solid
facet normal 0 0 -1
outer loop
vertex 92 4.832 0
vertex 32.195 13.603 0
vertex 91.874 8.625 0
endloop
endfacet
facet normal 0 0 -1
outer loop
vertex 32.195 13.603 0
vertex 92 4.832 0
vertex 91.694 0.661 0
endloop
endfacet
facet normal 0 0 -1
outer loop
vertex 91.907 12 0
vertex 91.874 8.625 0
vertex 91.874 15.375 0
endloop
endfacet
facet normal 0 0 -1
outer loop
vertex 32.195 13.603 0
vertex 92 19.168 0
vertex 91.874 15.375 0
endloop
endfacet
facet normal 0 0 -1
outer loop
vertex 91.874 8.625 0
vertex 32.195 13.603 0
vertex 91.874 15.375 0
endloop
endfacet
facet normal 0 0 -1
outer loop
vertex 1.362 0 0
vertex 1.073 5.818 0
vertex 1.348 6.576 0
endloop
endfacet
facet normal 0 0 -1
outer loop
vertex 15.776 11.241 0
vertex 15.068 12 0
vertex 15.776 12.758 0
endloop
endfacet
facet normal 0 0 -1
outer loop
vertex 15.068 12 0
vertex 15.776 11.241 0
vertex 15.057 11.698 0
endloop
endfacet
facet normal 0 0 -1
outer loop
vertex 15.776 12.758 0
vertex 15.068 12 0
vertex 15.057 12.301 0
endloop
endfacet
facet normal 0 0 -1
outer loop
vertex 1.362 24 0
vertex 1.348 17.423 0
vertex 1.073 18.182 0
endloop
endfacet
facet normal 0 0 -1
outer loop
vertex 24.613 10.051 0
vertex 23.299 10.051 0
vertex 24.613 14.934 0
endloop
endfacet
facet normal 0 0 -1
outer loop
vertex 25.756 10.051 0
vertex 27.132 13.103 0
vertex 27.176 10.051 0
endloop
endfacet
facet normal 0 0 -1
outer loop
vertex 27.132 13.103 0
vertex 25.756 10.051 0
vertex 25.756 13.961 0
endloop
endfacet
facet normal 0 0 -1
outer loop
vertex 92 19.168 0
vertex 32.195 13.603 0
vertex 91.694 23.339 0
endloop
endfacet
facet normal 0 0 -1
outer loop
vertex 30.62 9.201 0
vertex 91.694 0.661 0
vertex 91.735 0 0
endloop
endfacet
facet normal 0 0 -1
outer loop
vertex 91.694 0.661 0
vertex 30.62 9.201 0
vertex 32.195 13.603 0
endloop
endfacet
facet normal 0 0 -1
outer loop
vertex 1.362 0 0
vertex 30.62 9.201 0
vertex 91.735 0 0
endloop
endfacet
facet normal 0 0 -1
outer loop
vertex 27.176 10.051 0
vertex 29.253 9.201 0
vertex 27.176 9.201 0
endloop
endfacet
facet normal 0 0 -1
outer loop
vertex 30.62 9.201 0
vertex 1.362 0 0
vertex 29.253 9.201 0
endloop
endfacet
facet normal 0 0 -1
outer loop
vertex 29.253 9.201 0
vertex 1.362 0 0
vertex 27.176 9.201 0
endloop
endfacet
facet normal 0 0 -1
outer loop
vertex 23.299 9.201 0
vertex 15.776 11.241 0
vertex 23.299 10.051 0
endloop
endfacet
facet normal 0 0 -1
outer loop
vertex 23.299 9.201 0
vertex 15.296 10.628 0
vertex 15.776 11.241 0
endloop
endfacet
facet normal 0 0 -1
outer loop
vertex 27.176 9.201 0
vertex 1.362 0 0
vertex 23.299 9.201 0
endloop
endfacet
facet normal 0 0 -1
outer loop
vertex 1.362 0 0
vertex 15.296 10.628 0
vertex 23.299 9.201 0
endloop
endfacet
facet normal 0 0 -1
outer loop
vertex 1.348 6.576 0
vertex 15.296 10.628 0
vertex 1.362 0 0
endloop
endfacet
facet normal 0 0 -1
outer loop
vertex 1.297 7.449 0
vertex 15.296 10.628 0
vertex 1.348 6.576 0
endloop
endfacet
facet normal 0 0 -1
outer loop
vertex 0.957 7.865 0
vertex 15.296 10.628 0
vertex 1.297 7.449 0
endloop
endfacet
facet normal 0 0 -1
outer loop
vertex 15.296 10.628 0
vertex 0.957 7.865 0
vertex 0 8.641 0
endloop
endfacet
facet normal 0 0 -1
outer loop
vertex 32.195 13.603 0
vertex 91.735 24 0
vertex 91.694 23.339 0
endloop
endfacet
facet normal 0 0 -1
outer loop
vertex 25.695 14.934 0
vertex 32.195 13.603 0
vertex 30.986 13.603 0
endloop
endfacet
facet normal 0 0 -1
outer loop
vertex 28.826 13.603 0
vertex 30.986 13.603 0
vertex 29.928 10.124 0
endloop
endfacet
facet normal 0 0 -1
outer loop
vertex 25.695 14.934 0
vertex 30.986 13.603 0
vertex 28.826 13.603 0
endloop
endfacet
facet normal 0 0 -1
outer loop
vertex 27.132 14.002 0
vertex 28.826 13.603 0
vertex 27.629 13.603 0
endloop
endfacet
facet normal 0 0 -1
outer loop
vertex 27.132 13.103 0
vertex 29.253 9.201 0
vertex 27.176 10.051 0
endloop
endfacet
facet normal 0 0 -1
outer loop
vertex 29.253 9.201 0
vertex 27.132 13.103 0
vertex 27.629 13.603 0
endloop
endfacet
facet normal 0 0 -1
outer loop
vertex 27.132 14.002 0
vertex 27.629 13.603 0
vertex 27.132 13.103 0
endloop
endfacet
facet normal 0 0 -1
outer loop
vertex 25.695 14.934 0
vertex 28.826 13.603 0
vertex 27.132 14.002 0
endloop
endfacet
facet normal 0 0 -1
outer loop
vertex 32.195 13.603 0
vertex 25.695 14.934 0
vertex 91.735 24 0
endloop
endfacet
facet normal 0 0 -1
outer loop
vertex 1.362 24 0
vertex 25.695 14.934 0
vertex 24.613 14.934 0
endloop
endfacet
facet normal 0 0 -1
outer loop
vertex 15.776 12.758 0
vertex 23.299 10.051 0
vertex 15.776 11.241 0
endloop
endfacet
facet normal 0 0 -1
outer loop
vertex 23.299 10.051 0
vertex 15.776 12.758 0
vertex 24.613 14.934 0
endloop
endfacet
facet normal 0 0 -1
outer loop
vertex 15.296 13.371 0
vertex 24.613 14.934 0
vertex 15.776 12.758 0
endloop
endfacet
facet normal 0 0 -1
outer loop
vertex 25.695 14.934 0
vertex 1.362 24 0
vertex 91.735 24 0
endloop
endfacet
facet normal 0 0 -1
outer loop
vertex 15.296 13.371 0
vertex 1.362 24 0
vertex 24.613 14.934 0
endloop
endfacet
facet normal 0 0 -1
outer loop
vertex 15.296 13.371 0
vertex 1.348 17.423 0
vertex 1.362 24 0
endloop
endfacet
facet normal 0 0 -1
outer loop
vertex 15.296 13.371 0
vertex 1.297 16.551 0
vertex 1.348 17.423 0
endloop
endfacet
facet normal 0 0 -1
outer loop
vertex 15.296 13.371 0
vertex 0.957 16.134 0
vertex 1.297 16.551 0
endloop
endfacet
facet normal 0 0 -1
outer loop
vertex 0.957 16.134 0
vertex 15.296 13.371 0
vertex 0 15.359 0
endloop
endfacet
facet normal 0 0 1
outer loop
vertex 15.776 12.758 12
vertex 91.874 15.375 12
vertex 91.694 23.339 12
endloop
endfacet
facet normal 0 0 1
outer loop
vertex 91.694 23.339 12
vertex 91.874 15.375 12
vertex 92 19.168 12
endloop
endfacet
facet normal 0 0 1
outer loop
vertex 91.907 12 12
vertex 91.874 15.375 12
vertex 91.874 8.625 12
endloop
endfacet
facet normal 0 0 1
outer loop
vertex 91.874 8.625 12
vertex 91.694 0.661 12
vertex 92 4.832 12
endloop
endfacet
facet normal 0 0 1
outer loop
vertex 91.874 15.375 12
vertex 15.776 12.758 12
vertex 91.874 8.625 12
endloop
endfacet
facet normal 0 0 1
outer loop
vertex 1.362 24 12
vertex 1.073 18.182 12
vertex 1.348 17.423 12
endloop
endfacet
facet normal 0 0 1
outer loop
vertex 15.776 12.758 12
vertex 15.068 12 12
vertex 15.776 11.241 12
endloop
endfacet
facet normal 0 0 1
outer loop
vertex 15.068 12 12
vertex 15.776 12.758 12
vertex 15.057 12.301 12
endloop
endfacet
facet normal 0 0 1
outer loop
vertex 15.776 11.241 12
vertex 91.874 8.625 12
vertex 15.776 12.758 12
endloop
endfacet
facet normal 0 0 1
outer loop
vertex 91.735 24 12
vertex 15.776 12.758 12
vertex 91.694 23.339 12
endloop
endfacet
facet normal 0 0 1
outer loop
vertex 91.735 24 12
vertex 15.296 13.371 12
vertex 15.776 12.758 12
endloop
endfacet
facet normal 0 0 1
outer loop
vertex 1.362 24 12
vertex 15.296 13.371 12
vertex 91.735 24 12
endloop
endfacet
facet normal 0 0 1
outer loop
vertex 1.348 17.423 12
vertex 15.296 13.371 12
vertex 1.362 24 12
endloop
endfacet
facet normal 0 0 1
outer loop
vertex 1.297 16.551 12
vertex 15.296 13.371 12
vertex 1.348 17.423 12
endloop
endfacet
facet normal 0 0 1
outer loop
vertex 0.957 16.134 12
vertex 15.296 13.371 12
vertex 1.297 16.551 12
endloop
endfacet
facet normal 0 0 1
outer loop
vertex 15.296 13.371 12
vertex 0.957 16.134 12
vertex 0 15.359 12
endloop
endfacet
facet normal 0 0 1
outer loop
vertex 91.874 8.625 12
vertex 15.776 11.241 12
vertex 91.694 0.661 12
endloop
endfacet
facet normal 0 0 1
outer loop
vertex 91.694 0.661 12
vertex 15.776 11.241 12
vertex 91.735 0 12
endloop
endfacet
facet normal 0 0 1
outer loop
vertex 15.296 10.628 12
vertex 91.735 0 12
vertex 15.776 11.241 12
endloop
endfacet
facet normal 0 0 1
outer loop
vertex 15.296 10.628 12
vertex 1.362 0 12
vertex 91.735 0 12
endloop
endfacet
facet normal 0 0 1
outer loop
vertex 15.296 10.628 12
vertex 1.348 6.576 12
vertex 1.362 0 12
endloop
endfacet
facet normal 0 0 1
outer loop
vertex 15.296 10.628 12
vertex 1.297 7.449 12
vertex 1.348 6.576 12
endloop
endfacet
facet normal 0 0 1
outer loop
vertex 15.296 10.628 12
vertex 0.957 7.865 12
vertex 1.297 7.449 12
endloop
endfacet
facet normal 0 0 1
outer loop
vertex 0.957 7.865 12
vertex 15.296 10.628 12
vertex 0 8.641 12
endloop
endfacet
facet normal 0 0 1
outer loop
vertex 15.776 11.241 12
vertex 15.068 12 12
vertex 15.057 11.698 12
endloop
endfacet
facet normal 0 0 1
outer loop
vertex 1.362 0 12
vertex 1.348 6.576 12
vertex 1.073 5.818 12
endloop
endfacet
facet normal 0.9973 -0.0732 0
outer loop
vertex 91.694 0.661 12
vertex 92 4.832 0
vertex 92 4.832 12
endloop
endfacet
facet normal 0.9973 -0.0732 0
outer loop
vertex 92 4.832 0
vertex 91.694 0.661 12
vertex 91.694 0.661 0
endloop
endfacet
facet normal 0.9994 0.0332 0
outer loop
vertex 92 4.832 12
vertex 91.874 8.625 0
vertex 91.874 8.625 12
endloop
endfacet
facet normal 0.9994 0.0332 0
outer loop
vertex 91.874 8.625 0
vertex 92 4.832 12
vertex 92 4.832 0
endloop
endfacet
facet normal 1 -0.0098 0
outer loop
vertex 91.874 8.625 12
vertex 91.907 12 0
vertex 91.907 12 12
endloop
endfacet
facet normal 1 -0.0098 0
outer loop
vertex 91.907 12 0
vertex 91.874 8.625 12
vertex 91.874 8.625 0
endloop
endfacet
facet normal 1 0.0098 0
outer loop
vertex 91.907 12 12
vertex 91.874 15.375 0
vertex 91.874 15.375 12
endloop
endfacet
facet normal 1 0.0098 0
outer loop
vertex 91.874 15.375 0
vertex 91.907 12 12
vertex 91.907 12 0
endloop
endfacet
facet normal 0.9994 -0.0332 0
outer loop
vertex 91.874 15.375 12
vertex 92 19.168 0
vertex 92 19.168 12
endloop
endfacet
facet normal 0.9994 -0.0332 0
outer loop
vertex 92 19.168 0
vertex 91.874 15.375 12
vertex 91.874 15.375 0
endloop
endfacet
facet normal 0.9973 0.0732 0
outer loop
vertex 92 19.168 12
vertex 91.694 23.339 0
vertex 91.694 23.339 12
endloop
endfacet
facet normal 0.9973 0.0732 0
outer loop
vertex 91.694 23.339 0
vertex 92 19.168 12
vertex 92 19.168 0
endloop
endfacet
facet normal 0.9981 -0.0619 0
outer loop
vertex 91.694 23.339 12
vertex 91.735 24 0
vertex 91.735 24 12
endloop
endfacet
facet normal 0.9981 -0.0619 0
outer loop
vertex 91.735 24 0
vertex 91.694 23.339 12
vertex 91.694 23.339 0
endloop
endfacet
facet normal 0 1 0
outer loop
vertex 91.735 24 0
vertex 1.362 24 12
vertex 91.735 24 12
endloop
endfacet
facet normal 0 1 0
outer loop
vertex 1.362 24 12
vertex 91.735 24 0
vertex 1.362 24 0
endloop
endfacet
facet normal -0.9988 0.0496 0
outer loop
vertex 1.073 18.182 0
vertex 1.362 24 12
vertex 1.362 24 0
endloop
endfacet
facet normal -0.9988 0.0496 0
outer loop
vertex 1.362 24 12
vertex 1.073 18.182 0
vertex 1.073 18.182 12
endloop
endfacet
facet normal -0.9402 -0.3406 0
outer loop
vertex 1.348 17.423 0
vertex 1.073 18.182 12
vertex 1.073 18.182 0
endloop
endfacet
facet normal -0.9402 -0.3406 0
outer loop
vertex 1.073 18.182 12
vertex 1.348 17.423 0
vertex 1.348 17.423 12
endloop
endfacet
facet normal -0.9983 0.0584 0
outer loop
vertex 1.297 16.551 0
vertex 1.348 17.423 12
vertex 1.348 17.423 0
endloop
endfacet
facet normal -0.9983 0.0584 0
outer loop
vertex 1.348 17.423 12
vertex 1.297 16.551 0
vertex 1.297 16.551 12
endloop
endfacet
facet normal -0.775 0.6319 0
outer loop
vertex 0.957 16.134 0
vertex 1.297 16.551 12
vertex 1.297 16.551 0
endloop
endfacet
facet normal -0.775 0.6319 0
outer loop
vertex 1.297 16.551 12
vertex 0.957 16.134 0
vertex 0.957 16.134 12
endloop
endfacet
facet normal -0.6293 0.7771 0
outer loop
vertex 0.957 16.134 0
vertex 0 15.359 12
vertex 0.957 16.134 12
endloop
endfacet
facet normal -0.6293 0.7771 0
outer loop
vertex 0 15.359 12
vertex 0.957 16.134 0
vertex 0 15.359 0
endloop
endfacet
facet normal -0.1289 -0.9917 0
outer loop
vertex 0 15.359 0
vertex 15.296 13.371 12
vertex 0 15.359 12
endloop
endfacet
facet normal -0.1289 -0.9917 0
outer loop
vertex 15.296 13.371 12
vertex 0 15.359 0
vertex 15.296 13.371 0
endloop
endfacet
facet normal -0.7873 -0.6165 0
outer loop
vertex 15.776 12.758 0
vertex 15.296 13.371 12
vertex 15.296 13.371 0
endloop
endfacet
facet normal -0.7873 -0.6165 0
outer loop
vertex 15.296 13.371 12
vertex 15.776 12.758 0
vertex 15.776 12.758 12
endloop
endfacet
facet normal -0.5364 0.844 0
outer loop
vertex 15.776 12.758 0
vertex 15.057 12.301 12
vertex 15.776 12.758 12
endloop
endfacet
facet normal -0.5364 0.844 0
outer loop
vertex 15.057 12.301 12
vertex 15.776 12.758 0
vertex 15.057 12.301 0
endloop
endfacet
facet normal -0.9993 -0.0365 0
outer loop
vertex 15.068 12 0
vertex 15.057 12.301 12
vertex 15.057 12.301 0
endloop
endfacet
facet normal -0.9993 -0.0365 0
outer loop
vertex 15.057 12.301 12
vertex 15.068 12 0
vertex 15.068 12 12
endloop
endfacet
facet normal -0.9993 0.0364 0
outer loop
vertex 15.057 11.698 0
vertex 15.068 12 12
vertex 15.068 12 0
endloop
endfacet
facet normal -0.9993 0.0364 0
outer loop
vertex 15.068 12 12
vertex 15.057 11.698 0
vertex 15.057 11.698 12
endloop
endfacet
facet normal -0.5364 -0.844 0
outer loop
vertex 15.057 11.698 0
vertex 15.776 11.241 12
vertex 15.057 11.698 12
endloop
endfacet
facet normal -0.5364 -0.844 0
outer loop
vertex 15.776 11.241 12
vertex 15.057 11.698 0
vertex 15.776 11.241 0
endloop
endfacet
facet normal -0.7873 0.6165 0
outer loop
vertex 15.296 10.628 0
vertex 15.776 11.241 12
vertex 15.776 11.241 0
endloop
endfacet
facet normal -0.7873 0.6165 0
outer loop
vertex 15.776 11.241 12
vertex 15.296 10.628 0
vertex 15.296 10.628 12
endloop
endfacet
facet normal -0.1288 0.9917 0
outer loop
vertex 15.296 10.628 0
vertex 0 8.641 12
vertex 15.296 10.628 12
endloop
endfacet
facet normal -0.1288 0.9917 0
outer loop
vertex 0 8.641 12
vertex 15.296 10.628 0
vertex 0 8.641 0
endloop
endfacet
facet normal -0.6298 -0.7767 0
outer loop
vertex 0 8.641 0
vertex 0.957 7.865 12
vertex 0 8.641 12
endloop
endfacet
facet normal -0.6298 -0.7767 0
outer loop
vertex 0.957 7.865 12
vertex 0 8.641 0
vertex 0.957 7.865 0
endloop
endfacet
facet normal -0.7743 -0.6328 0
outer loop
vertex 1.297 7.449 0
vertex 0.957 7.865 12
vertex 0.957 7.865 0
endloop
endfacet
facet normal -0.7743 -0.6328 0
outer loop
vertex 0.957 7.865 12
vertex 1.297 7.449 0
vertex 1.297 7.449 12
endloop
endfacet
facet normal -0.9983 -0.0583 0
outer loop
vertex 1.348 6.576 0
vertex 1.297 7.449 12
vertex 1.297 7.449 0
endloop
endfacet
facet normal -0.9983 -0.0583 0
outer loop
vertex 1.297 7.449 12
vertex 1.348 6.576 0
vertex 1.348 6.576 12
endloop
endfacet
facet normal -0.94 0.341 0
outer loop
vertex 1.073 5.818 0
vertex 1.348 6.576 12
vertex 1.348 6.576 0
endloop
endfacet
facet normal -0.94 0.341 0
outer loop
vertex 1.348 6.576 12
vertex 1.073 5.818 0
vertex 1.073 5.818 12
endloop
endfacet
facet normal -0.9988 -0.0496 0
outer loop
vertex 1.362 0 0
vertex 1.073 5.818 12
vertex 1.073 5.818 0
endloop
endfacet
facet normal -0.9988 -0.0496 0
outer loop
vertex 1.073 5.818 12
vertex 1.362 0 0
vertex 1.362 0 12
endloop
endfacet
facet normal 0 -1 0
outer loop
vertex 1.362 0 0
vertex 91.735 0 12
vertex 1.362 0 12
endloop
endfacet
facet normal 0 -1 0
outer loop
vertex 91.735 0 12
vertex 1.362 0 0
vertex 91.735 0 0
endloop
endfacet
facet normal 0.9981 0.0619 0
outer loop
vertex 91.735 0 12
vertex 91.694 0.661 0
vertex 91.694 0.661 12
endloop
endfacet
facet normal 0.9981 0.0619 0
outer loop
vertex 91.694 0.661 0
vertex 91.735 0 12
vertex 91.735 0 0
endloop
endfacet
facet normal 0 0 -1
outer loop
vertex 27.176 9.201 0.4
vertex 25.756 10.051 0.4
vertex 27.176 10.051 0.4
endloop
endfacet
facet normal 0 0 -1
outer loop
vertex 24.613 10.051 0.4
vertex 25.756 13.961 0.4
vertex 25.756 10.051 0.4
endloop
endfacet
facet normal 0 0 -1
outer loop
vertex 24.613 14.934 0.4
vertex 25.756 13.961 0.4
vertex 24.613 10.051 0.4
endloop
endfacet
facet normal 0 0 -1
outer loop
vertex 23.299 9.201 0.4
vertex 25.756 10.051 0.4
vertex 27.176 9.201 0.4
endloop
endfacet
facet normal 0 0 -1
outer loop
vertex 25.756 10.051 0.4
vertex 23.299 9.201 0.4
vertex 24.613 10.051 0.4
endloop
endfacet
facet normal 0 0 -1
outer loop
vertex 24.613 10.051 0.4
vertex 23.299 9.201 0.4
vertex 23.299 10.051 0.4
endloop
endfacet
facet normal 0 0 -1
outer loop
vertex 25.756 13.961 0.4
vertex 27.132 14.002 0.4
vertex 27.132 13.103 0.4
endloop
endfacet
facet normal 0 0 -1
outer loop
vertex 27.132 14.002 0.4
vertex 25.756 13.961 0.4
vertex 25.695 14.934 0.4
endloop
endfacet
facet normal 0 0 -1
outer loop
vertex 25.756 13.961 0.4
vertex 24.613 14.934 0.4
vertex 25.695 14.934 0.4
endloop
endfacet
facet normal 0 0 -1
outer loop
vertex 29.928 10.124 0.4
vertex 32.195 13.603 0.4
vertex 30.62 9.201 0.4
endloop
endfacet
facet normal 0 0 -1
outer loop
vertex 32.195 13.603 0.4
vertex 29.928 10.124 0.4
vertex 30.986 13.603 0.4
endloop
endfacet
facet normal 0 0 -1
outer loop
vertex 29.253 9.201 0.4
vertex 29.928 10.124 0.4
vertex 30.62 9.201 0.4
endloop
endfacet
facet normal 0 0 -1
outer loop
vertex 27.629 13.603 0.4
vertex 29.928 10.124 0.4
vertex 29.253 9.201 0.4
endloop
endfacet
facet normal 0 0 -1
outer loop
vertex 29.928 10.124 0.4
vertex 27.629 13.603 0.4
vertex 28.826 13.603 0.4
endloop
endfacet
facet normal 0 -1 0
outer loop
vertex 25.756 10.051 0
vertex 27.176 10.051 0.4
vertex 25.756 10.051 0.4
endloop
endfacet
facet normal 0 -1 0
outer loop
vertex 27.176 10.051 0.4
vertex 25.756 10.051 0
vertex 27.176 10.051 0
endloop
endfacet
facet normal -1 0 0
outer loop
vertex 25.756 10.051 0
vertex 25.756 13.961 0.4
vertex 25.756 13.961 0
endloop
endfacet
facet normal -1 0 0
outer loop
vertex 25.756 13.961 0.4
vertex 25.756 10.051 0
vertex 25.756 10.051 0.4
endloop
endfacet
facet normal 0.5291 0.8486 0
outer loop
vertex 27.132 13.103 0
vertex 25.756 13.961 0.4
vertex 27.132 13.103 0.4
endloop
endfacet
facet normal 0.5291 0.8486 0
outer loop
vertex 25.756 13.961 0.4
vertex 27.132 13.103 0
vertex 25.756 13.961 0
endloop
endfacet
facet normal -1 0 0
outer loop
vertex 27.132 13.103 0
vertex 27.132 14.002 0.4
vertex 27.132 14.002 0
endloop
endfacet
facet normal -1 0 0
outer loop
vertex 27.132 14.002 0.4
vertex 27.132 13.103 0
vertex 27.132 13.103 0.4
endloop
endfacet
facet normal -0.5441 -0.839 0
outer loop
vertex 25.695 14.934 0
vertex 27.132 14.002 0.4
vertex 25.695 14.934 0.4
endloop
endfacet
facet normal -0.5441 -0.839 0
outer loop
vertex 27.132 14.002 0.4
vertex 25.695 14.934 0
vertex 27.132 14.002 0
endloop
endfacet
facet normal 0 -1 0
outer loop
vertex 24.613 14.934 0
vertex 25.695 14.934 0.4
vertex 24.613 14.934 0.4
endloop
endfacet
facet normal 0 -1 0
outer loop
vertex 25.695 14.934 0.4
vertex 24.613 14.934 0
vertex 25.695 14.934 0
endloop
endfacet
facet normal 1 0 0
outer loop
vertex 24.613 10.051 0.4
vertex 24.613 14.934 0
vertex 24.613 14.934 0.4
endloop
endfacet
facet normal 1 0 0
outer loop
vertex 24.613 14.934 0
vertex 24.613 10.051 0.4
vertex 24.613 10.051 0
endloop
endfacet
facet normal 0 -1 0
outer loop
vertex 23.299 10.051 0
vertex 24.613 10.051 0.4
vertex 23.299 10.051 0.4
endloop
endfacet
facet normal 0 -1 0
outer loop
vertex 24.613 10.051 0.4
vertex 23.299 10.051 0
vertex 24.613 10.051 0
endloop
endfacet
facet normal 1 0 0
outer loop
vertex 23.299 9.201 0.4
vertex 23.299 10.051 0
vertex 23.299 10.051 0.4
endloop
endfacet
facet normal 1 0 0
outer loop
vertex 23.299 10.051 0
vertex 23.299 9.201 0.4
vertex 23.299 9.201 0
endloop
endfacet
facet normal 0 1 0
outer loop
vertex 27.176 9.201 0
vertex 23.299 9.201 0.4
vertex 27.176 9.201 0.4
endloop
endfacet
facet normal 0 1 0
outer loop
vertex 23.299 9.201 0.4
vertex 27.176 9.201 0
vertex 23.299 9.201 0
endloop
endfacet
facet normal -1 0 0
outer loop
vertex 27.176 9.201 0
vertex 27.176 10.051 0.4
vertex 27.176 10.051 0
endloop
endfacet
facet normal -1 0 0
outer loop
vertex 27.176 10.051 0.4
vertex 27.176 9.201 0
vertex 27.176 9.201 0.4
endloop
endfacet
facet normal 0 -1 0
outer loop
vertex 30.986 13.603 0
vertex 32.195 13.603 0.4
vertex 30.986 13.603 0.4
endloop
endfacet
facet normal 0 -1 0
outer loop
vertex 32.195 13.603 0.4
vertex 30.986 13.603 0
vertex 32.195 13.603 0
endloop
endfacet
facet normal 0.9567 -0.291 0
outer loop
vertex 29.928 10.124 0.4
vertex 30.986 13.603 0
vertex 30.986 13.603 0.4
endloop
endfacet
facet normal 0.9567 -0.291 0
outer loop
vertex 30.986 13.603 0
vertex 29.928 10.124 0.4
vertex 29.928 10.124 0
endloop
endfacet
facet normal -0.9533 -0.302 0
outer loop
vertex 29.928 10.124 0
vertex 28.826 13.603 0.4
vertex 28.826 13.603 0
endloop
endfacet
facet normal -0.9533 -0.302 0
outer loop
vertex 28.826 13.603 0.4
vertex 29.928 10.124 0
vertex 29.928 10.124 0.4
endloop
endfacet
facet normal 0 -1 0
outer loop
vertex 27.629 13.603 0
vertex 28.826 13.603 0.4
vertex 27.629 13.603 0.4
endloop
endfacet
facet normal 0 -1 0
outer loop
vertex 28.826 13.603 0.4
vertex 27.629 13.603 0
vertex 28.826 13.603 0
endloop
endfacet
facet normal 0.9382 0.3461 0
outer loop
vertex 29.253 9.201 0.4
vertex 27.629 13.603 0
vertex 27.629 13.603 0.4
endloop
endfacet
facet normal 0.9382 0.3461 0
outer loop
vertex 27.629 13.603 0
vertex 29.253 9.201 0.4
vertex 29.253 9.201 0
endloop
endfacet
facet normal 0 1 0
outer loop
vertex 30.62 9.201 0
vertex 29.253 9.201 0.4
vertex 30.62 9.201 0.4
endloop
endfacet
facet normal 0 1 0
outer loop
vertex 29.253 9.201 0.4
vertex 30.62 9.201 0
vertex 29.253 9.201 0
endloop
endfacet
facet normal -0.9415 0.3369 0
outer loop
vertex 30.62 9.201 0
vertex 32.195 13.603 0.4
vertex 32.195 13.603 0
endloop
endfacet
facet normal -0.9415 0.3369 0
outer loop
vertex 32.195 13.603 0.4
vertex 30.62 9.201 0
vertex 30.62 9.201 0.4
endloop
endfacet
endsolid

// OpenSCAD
// test — generated by protobot from a sketch (input.jpg)
// 2026-10-27
//
// Print: Prusa Core One, 0.4 mm nozzle, PLA, 0.2 mm layers, flat on the bed.
// The outline is stored in a 0..1 unit box and scaled by LENGTH/WIDTH, so
// the three measurements below are all you need to change. Re-export with:
//   openscad --backend=manifold --export-format binstl -o test.stl test.scad
//
// Dimension tags: [M] = given by the user, [S] = traced from the sketch.

/* [Measurements] */
LENGTH    = 92;   // [M] X extent, mm
WIDTH     = 24;   // [M] Y extent, mm
THICKNESS = 12;   // [M] extrusion height, mm

/* [Edge finish] */
// Perimeter edges (outline AND holes), top and bottom faces.
// "fillet" = rounded, "chamfer" = 45°, "none" = sharp. Built in LAYER steps,
// i.e. exactly as the printer will lay it down.
EDGE_TOP_KIND    = "none";
EDGE_TOP         = 0;     // mm
EDGE_BOTTOM_KIND = "none";
EDGE_BOTTOM      = 0;     // mm
LAYER            = 0.2;   // mm, print layer height

/* [Version stamp] */
VERSION        = 1;       // bump every revision
VERSION_POS    = [0.3011, 0.5000];  // [S] unit-box spot deepest inside the shape
VERSION_SIZE   = 6;      // mm text height
VERSION_DEPTH  = 0.4;    // mm, 2 layers at 0.2

/* [Hidden] */
// [S] traced outline (+ holes), unit box, y up.
OUTLINE_PTS = [
    [0.99863,0.35936], [1.00000,0.20133], [0.99668,0.02753], [0.99712,0.00000], [0.01481,0.00000], [0.01166,0.24242],
    [0.01465,0.27402], [0.01410,0.31037], [0.01042,0.32773], [0.00000,0.36005], [0.16626,0.44285], [0.17148,0.46839],
    [0.16367,0.48744], [0.16380,0.50000], [0.16367,0.51256], [0.17148,0.53161], [0.16626,0.55715], [0.00000,0.63995],
    [0.01042,0.67227], [0.01410,0.68963], [0.01465,0.72598], [0.01166,0.75758], [0.01481,1.00000], [0.99712,1.00000],
    [0.99668,0.97247], [1.00000,0.79867], [0.99863,0.64064], [0.99900,0.50000]
];
OUTLINE_PATHS = [
    [for (i = [0:27]) i]
];

module outline_2d() {
    scale([LENGTH, WIDTH]) polygon(points = OUTLINE_PTS, paths = OUTLINE_PATHS);
}

// Debossed into the bottom face, mirrored so it reads from underneath.
module version_stamp() {
    if (!is_undef(VERSION_POS) && VERSION_SIZE > 0)
        translate([VERSION_POS[0] * LENGTH, VERSION_POS[1] * WIDTH, -0.01])
            linear_extrude(VERSION_DEPTH + 0.01)
                mirror([1, 0])
                    text(str("v", VERSION), size = VERSION_SIZE,
                         font = "Liberation Sans:style=Bold",
                         halign = "center", valign = "center");
}

// How far the outline is pulled in at depth d (0..r) into a finished edge.
function edge_inset(kind, r, d) =
    kind == "chamfer" ? max(0, r - d) :
    kind == "fillet"  ? r - sqrt(max(0, r * r - (r - min(d, r)) * (r - min(d, r)))) : 0;

module body() {
    nb = EDGE_BOTTOM_KIND == "none" ? 0 : ceil(EDGE_BOTTOM / LAYER - 1e-6);
    nt = EDGE_TOP_KIND    == "none" ? 0 : ceil(EDGE_TOP / LAYER - 1e-6);
    zb = nb * LAYER;
    zt = nt * LAYER;
    union() {
        // straight-walled core, overlapping the finished layers (no shared faces)
        translate([0, 0, zb - (nb > 0 ? 0.01 : 0)])
            linear_extrude(THICKNESS - zb - zt + (nb > 0 ? 0.01 : 0) + (nt > 0 ? 0.01 : 0))
                outline_2d();
        if (nb > 0) for (i = [0 : nb - 1])
            translate([0, 0, i * LAYER])
                linear_extrude(LAYER + 0.01)
                    offset(delta = -edge_inset(EDGE_BOTTOM_KIND, EDGE_BOTTOM, (i + 0.5) * LAYER))
                        outline_2d();
        if (nt > 0) for (i = [0 : nt - 1])
            translate([0, 0, THICKNESS - (i + 1) * LAYER - (i < nt - 1 ? 0.01 : 0)])
                linear_extrude(LAYER + (i < nt - 1 ? 0.01 : 0))
                    offset(delta = -edge_inset(EDGE_TOP_KIND, EDGE_TOP, (i + 0.5) * LAYER))
                        outline_2d();
    }
}

module part() {
    $fa = 2; $fs = 0.4;
    difference() {
        body();
        version_stamp();
    }
}

part();
